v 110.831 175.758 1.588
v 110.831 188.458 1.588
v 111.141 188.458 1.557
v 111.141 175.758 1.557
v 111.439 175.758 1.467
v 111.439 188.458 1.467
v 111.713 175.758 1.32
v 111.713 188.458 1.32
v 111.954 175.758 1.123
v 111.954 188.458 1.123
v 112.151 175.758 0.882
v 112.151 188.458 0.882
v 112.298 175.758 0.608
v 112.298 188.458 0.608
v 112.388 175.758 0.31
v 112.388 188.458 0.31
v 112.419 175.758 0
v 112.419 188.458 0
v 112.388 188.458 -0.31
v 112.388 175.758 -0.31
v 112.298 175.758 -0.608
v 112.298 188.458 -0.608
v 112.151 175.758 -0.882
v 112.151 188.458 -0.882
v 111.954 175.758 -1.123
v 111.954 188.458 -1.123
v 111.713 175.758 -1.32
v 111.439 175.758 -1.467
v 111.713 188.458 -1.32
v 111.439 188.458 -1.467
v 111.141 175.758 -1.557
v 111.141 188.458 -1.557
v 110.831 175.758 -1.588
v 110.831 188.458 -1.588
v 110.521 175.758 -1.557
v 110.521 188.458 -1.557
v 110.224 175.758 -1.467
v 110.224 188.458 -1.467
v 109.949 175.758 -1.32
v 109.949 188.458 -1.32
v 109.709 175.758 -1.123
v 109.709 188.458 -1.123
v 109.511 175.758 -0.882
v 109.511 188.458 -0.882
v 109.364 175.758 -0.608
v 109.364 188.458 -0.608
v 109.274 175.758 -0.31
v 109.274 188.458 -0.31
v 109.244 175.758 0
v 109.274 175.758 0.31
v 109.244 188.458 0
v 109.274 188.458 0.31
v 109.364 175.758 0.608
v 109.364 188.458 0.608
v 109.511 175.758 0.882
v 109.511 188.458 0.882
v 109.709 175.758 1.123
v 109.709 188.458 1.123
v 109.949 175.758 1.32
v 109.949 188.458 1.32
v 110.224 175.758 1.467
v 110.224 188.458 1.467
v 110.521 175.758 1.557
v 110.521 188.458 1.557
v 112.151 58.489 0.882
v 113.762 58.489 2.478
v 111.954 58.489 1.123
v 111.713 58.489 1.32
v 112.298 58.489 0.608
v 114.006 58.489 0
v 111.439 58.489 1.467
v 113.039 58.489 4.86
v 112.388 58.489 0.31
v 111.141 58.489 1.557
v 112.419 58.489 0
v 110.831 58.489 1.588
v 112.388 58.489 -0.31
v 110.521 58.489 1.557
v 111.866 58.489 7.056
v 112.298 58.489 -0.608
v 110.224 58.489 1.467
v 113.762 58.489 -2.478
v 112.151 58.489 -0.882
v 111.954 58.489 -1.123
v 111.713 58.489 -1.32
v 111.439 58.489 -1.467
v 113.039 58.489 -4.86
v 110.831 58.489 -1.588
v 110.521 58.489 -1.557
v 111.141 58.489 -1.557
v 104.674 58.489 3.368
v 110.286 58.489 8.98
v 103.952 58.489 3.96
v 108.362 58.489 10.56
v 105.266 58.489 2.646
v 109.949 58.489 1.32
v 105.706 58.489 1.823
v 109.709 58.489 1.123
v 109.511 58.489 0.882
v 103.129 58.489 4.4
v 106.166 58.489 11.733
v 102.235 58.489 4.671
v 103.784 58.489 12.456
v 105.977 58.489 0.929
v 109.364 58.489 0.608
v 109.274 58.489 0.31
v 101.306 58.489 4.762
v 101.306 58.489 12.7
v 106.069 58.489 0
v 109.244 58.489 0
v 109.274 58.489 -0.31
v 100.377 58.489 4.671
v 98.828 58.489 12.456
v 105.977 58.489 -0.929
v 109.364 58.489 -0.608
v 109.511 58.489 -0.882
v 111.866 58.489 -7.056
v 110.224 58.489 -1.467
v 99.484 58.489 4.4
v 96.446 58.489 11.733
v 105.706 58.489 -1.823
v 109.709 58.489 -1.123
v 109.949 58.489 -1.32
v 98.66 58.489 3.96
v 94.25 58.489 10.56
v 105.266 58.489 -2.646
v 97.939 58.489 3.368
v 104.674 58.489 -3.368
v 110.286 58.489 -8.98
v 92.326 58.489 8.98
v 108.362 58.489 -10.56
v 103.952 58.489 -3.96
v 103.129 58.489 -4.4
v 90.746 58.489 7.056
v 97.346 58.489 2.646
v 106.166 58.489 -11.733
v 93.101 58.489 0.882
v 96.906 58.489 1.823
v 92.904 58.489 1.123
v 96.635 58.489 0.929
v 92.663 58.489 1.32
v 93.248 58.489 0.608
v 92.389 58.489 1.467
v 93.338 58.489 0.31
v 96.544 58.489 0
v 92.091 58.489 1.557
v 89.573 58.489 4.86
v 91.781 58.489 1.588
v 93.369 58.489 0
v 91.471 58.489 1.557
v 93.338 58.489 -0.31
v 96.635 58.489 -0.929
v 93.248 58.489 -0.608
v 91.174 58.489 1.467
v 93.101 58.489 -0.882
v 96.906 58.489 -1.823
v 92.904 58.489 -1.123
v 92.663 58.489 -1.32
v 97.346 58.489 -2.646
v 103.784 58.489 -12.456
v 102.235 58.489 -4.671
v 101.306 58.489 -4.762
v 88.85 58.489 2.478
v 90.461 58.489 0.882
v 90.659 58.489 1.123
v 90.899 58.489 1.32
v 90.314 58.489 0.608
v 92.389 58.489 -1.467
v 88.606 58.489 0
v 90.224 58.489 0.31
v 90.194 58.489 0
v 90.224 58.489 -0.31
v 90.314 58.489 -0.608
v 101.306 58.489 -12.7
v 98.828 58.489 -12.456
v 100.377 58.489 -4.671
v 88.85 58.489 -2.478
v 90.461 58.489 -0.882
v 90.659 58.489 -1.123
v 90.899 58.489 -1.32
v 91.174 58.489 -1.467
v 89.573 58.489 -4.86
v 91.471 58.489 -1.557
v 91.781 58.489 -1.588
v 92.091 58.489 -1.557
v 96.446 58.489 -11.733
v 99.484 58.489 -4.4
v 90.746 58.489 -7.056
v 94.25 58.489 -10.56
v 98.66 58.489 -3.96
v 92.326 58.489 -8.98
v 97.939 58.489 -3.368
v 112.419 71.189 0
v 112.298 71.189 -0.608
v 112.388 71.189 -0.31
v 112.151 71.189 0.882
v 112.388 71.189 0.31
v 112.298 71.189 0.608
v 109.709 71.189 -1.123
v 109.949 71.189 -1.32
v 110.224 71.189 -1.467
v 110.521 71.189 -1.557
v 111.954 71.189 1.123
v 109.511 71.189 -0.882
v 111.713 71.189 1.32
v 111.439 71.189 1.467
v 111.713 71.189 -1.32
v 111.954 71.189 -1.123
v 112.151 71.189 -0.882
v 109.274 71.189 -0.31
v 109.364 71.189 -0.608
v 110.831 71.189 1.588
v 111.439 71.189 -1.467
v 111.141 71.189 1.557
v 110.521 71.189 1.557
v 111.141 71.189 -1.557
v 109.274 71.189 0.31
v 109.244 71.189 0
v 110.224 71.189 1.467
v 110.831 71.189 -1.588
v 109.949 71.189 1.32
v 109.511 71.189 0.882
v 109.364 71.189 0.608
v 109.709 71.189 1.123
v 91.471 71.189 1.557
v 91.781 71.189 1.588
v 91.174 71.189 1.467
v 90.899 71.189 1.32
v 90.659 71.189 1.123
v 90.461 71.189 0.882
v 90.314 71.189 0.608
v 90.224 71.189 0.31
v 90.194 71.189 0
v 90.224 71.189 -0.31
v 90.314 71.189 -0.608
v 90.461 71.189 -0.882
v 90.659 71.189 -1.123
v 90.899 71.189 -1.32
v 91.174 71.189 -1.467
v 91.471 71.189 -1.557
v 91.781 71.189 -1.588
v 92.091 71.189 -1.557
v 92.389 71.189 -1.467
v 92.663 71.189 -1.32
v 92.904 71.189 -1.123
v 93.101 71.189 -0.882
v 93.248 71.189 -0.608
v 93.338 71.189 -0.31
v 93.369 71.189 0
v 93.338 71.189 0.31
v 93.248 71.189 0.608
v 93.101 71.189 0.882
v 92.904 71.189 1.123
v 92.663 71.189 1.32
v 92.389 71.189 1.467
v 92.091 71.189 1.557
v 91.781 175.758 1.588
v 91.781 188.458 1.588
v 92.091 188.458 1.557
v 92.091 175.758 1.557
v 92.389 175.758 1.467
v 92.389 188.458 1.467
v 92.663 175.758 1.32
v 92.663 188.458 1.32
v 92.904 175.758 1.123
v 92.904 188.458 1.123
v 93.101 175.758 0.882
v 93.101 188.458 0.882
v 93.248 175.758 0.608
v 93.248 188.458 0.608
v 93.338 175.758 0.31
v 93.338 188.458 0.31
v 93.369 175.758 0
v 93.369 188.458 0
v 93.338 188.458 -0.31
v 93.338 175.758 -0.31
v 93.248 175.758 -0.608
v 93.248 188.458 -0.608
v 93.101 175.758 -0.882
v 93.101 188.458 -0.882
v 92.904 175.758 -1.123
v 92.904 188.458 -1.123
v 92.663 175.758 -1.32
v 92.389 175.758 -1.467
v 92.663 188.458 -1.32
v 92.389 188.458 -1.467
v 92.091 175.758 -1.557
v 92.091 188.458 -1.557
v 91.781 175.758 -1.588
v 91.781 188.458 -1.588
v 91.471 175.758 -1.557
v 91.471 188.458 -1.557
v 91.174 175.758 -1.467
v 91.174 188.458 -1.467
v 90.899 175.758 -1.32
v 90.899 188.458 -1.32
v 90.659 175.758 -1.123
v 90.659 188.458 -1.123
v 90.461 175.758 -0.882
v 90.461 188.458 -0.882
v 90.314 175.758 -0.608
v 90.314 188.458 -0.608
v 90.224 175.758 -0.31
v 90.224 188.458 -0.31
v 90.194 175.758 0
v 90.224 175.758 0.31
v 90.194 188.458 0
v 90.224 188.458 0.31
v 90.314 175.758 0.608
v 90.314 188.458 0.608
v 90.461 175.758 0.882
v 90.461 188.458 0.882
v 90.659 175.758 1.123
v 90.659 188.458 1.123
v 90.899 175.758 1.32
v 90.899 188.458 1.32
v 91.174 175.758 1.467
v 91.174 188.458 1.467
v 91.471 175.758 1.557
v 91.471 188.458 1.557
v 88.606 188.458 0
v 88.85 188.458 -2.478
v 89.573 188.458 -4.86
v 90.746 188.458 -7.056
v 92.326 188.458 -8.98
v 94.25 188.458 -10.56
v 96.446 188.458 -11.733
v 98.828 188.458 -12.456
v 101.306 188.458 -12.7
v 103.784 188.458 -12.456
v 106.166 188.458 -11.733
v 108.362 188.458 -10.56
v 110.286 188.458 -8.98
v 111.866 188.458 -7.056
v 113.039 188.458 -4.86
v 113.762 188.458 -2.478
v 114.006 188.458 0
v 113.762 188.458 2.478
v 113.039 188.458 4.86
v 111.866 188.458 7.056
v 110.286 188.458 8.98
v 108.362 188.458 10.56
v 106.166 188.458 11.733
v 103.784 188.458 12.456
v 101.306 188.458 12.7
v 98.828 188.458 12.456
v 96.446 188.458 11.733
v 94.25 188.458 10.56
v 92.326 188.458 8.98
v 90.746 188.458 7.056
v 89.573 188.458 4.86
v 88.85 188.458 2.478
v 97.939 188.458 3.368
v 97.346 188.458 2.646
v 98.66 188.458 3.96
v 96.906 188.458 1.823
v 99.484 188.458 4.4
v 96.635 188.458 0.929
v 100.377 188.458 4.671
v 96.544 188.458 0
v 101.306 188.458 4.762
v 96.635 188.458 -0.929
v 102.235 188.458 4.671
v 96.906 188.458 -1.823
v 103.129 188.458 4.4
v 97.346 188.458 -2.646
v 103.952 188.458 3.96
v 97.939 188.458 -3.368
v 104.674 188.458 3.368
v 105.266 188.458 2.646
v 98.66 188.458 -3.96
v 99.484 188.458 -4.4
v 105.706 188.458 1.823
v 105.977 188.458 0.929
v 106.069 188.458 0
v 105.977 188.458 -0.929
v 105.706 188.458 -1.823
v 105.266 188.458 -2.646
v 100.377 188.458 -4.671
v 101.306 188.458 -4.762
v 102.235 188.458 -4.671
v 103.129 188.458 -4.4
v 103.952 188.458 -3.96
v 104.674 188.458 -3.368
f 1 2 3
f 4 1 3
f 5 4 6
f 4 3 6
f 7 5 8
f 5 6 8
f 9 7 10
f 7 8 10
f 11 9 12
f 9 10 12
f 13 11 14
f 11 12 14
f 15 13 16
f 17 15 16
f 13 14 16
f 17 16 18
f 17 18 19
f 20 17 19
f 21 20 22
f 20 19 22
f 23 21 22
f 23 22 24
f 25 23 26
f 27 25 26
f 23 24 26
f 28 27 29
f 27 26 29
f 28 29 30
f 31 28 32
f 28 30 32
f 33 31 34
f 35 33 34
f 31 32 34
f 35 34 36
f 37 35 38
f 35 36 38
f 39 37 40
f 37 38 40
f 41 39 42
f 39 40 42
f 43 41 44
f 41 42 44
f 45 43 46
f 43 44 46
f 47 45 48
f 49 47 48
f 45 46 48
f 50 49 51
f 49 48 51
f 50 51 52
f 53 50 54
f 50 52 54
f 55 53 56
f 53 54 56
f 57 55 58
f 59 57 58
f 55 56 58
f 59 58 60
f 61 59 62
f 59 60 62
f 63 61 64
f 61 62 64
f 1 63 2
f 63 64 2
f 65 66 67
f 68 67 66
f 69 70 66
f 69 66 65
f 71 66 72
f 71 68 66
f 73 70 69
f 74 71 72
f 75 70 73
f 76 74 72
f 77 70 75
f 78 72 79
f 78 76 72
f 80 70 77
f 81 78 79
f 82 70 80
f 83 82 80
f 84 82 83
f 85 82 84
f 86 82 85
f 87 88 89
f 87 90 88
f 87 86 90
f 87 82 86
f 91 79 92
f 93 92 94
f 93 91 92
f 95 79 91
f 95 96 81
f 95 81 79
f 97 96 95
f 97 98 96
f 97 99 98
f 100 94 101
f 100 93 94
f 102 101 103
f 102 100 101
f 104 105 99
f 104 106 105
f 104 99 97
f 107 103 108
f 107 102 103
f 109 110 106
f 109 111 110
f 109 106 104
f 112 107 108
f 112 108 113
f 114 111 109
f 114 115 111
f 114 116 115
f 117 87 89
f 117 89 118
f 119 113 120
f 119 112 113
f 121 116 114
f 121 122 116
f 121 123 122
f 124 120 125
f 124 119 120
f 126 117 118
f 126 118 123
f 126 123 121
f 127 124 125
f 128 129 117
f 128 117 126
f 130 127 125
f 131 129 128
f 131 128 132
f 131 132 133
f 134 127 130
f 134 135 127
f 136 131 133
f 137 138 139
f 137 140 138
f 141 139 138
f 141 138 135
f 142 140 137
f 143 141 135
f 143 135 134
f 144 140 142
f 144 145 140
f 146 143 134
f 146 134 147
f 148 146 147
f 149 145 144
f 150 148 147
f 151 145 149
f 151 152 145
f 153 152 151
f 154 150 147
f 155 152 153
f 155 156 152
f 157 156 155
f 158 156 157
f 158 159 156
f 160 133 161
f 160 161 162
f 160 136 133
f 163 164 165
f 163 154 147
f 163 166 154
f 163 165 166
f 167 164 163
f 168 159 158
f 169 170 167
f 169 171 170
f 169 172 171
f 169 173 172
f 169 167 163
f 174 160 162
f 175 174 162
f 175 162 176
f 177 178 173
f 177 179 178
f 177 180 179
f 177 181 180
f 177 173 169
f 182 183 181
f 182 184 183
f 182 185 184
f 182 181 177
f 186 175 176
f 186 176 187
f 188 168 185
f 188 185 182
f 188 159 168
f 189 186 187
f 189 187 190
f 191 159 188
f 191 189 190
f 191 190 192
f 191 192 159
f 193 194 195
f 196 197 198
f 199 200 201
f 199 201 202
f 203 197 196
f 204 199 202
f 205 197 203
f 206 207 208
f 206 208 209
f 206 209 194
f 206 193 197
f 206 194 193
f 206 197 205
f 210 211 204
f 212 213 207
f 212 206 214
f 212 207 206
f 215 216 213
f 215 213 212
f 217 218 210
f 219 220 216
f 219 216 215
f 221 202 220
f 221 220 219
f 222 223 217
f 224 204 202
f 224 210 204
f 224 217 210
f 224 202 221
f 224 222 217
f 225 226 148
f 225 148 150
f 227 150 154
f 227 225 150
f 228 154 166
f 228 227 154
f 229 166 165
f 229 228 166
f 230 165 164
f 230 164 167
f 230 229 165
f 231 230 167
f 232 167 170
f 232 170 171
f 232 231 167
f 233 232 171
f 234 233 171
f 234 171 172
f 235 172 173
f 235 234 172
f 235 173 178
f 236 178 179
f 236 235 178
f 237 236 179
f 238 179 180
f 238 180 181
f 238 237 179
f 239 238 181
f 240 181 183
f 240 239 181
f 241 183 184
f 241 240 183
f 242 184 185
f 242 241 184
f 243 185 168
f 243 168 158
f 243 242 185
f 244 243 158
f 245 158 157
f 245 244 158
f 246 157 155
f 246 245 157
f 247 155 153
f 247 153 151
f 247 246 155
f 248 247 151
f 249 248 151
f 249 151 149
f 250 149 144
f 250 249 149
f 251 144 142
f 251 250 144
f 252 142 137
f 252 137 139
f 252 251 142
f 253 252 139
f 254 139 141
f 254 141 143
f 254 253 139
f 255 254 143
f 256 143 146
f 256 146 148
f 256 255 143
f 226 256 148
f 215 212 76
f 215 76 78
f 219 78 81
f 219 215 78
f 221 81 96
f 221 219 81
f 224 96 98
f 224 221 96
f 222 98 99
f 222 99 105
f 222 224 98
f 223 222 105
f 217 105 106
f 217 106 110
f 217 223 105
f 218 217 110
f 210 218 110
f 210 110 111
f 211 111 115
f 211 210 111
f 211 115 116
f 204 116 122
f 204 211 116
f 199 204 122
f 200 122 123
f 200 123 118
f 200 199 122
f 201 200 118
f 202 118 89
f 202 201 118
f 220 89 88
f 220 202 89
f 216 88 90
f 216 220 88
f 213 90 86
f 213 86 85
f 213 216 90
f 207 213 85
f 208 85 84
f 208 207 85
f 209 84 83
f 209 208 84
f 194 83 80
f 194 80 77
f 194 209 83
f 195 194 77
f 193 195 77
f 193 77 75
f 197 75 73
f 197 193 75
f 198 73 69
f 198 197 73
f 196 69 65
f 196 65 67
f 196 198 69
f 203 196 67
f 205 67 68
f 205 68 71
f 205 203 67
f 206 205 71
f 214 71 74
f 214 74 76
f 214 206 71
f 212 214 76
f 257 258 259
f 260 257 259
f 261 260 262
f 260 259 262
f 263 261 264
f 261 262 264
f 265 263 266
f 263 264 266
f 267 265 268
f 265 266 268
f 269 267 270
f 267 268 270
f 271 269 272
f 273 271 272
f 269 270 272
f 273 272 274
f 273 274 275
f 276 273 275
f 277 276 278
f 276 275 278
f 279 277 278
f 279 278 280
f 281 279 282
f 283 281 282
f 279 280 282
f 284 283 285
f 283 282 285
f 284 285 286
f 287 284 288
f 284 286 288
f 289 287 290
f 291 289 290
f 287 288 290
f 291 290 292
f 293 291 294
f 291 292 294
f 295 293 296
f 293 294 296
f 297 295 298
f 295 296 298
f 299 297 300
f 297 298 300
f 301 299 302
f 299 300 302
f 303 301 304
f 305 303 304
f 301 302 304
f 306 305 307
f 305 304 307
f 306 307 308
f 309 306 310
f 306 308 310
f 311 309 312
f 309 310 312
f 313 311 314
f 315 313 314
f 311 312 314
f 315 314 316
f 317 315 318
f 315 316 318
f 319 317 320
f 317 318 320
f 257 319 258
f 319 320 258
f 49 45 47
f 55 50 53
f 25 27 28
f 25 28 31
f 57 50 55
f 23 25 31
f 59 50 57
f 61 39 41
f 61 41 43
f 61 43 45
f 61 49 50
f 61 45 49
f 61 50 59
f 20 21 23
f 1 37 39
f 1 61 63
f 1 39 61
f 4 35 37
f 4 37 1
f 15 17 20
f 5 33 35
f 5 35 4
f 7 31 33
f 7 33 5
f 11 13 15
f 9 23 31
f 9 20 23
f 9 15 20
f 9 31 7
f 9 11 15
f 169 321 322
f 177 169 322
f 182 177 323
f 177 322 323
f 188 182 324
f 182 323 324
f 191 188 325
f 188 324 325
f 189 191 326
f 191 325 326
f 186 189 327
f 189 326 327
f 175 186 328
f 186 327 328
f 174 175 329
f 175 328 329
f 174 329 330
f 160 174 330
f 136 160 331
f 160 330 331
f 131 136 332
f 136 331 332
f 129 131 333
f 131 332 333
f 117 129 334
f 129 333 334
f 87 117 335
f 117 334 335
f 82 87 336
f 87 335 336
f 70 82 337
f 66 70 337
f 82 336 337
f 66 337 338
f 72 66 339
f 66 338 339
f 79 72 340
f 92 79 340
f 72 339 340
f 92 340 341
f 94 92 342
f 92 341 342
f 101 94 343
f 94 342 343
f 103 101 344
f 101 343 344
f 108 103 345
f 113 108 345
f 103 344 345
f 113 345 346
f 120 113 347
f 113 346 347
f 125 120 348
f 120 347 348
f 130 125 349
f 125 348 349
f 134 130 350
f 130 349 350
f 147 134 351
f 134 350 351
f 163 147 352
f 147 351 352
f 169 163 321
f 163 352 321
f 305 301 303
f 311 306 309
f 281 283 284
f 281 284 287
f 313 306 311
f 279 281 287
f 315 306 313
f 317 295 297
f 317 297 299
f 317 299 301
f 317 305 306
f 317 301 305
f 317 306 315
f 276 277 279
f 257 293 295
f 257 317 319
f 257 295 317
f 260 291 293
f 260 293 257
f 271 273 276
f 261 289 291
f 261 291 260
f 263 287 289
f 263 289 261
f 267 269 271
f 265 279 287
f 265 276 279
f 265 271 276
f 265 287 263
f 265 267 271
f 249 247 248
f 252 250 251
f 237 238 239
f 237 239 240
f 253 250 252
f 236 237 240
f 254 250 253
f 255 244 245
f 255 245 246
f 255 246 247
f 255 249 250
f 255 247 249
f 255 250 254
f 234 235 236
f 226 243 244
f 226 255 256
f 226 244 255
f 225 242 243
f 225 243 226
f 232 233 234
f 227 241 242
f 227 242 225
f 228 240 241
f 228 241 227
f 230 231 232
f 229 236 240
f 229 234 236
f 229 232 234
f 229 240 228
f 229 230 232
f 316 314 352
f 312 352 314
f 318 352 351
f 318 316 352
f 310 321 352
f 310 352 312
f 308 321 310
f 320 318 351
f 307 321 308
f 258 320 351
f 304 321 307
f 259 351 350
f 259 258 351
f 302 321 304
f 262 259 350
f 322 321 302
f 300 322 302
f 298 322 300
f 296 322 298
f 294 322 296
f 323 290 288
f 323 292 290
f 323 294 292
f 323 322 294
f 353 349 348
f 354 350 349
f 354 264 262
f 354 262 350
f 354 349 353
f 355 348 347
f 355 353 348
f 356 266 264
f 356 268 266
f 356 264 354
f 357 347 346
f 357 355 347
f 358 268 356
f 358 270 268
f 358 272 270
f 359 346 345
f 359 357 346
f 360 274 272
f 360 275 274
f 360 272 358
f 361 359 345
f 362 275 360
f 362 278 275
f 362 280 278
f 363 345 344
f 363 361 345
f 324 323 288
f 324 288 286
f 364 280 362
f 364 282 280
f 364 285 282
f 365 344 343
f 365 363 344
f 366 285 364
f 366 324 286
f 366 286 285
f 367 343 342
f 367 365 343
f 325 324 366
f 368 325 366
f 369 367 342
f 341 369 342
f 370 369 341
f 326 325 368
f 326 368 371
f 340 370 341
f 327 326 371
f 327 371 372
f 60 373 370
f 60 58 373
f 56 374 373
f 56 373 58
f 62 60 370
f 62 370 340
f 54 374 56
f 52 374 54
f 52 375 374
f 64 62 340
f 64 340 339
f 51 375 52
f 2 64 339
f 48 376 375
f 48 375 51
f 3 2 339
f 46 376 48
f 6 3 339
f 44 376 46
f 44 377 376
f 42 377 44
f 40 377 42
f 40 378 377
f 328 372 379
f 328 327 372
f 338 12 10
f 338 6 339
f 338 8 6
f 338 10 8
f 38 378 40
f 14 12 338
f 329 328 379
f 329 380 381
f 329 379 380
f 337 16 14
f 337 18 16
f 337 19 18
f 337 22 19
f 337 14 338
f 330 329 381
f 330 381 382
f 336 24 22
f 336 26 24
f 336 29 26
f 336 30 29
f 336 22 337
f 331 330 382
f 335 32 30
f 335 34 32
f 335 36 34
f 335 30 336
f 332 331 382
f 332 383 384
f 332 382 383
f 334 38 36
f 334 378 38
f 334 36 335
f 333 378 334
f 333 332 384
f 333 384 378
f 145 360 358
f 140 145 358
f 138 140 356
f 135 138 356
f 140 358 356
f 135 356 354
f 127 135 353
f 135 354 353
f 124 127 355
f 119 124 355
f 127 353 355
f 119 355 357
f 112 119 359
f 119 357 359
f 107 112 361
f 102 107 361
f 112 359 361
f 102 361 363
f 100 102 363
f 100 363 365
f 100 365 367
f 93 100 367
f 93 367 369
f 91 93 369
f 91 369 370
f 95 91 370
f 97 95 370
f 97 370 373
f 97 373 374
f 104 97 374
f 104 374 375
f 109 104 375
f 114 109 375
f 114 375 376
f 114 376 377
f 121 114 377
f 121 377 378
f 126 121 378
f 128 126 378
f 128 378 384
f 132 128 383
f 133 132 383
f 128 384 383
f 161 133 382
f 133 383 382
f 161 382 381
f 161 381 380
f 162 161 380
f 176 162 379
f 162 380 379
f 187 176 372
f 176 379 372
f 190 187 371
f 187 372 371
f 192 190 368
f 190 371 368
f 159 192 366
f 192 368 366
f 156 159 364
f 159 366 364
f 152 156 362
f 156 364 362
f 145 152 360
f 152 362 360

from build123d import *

# Parameters (mm, degrees)
SKETCH1_W               = 12.7
SKETCH1_H               = 259.938138032
SKETCH2_R               = 4.7625
CUT_EXTRUDE1_DEPTH      = 285.124126062
CUT_EXTRUDE2_DEPTH      = 339.459088986
CUT_EXTRUDE2_DEPTH_BACK = 339.459088986
SKETCH3_W               = 82.52004382
SKETCH3_H               = 140.871037148
SKETCH4_R               = 1.5875
CUT_EXTRUDE3_DEPTH      = 12.7
CUT_EXTRUDE4_START      = -12.7
SKETCH5_R               = 1.5875
CUT_EXTRUDE4_DEPTH      = 12.7


with BuildPart() as part:
    # Sketch1 → Revolve1 (revolve)
    with BuildSketch(Plane.XY):
        with Locations((94.956111271, 188.458114984)):
            Rectangle(SKETCH1_W, SKETCH1_H)
    revolve(axis=Axis((101.306111271, 318.427184, 0), (0, -1, 0)))

    # Sketch2 → Cut-Extrude1 (cut, through all)
    with BuildSketch(Plane(origin=(0, 318.427184, 0), x_dir=(1, 0, 0), z_dir=(0, 1, 0))):
        with Locations(Location((101.306111271, 0, 0), (0, 0, 180))):
            Circle(SKETCH2_R)
    extrude(amount=-CUT_EXTRUDE1_DEPTH, mode=Mode.SUBTRACT)

    # Sketch3 → Cut-Extrude2 (cut, two sides: drawn at the far end of the back side and taken through both)
    with BuildSketch(Plane.XY.offset(-CUT_EXTRUDE2_DEPTH_BACK)):
        with Locations((93.882760048, 258.893633558)):
            Rectangle(SKETCH3_W, SKETCH3_H)
    extrude(amount=CUT_EXTRUDE2_DEPTH + CUT_EXTRUDE2_DEPTH_BACK, mode=Mode.SUBTRACT)

    # Sketch4 → Cut-Extrude3 (cut)
    with BuildSketch(Plane(origin=(0, 188.458114984, 0), x_dir=(1, 0, 0), z_dir=(0, 1, 0))):
        with Locations(Location((91.781111271, 0, 0), (0, 0, 270))):
            Circle(SKETCH4_R)
        with Locations(Location((110.831111271, 0, 0), (0, 0, 270))):
            Circle(SKETCH4_R)
    extrude(amount=-CUT_EXTRUDE3_DEPTH, mode=Mode.SUBTRACT)

    # Sketch5 → Cut-Extrude4 (cut)
    with BuildSketch(Plane.XZ.offset(-58.489045968).offset(CUT_EXTRUDE4_START)):
        with Locations(Location((91.781111271, 0, 0), (0, 0, 90))):
            Circle(SKETCH5_R)
        with Locations(Location((110.831111271, 0, 0), (0, 0, 90))):
            Circle(SKETCH5_R)
    extrude(amount=CUT_EXTRUDE4_DEPTH, mode=Mode.SUBTRACT)


solid = part.part
